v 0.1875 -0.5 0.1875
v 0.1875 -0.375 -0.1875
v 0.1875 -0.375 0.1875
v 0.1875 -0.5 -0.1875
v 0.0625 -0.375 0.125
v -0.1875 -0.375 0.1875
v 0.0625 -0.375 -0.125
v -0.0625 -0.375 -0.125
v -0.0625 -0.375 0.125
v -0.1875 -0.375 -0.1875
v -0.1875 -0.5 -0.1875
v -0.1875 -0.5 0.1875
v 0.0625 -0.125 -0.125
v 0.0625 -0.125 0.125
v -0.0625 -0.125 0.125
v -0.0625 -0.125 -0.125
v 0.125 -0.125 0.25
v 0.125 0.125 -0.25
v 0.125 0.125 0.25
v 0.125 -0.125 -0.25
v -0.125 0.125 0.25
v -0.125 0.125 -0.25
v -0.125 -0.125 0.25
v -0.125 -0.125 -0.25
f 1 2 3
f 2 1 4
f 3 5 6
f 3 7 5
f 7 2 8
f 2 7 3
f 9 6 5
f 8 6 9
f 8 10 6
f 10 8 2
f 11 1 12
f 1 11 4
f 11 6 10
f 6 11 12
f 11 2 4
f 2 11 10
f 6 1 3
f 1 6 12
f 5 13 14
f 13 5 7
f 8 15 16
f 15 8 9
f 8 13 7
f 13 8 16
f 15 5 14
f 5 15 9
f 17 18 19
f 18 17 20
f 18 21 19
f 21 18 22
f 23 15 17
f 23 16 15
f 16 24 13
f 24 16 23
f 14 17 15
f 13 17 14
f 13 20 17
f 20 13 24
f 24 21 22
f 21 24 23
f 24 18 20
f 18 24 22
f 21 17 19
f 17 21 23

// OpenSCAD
rotate(-90, [1, 0, 0]) {
    translate([0, 0, -7/16])
    cube([6/16, 6/16, 2/16], center = true);
    translate([0, 0, -4/16])
    cube([2/16, 4/16, 8/16], center = true);
    cube([4/16, 8/16, 4/16], center = true);
}
